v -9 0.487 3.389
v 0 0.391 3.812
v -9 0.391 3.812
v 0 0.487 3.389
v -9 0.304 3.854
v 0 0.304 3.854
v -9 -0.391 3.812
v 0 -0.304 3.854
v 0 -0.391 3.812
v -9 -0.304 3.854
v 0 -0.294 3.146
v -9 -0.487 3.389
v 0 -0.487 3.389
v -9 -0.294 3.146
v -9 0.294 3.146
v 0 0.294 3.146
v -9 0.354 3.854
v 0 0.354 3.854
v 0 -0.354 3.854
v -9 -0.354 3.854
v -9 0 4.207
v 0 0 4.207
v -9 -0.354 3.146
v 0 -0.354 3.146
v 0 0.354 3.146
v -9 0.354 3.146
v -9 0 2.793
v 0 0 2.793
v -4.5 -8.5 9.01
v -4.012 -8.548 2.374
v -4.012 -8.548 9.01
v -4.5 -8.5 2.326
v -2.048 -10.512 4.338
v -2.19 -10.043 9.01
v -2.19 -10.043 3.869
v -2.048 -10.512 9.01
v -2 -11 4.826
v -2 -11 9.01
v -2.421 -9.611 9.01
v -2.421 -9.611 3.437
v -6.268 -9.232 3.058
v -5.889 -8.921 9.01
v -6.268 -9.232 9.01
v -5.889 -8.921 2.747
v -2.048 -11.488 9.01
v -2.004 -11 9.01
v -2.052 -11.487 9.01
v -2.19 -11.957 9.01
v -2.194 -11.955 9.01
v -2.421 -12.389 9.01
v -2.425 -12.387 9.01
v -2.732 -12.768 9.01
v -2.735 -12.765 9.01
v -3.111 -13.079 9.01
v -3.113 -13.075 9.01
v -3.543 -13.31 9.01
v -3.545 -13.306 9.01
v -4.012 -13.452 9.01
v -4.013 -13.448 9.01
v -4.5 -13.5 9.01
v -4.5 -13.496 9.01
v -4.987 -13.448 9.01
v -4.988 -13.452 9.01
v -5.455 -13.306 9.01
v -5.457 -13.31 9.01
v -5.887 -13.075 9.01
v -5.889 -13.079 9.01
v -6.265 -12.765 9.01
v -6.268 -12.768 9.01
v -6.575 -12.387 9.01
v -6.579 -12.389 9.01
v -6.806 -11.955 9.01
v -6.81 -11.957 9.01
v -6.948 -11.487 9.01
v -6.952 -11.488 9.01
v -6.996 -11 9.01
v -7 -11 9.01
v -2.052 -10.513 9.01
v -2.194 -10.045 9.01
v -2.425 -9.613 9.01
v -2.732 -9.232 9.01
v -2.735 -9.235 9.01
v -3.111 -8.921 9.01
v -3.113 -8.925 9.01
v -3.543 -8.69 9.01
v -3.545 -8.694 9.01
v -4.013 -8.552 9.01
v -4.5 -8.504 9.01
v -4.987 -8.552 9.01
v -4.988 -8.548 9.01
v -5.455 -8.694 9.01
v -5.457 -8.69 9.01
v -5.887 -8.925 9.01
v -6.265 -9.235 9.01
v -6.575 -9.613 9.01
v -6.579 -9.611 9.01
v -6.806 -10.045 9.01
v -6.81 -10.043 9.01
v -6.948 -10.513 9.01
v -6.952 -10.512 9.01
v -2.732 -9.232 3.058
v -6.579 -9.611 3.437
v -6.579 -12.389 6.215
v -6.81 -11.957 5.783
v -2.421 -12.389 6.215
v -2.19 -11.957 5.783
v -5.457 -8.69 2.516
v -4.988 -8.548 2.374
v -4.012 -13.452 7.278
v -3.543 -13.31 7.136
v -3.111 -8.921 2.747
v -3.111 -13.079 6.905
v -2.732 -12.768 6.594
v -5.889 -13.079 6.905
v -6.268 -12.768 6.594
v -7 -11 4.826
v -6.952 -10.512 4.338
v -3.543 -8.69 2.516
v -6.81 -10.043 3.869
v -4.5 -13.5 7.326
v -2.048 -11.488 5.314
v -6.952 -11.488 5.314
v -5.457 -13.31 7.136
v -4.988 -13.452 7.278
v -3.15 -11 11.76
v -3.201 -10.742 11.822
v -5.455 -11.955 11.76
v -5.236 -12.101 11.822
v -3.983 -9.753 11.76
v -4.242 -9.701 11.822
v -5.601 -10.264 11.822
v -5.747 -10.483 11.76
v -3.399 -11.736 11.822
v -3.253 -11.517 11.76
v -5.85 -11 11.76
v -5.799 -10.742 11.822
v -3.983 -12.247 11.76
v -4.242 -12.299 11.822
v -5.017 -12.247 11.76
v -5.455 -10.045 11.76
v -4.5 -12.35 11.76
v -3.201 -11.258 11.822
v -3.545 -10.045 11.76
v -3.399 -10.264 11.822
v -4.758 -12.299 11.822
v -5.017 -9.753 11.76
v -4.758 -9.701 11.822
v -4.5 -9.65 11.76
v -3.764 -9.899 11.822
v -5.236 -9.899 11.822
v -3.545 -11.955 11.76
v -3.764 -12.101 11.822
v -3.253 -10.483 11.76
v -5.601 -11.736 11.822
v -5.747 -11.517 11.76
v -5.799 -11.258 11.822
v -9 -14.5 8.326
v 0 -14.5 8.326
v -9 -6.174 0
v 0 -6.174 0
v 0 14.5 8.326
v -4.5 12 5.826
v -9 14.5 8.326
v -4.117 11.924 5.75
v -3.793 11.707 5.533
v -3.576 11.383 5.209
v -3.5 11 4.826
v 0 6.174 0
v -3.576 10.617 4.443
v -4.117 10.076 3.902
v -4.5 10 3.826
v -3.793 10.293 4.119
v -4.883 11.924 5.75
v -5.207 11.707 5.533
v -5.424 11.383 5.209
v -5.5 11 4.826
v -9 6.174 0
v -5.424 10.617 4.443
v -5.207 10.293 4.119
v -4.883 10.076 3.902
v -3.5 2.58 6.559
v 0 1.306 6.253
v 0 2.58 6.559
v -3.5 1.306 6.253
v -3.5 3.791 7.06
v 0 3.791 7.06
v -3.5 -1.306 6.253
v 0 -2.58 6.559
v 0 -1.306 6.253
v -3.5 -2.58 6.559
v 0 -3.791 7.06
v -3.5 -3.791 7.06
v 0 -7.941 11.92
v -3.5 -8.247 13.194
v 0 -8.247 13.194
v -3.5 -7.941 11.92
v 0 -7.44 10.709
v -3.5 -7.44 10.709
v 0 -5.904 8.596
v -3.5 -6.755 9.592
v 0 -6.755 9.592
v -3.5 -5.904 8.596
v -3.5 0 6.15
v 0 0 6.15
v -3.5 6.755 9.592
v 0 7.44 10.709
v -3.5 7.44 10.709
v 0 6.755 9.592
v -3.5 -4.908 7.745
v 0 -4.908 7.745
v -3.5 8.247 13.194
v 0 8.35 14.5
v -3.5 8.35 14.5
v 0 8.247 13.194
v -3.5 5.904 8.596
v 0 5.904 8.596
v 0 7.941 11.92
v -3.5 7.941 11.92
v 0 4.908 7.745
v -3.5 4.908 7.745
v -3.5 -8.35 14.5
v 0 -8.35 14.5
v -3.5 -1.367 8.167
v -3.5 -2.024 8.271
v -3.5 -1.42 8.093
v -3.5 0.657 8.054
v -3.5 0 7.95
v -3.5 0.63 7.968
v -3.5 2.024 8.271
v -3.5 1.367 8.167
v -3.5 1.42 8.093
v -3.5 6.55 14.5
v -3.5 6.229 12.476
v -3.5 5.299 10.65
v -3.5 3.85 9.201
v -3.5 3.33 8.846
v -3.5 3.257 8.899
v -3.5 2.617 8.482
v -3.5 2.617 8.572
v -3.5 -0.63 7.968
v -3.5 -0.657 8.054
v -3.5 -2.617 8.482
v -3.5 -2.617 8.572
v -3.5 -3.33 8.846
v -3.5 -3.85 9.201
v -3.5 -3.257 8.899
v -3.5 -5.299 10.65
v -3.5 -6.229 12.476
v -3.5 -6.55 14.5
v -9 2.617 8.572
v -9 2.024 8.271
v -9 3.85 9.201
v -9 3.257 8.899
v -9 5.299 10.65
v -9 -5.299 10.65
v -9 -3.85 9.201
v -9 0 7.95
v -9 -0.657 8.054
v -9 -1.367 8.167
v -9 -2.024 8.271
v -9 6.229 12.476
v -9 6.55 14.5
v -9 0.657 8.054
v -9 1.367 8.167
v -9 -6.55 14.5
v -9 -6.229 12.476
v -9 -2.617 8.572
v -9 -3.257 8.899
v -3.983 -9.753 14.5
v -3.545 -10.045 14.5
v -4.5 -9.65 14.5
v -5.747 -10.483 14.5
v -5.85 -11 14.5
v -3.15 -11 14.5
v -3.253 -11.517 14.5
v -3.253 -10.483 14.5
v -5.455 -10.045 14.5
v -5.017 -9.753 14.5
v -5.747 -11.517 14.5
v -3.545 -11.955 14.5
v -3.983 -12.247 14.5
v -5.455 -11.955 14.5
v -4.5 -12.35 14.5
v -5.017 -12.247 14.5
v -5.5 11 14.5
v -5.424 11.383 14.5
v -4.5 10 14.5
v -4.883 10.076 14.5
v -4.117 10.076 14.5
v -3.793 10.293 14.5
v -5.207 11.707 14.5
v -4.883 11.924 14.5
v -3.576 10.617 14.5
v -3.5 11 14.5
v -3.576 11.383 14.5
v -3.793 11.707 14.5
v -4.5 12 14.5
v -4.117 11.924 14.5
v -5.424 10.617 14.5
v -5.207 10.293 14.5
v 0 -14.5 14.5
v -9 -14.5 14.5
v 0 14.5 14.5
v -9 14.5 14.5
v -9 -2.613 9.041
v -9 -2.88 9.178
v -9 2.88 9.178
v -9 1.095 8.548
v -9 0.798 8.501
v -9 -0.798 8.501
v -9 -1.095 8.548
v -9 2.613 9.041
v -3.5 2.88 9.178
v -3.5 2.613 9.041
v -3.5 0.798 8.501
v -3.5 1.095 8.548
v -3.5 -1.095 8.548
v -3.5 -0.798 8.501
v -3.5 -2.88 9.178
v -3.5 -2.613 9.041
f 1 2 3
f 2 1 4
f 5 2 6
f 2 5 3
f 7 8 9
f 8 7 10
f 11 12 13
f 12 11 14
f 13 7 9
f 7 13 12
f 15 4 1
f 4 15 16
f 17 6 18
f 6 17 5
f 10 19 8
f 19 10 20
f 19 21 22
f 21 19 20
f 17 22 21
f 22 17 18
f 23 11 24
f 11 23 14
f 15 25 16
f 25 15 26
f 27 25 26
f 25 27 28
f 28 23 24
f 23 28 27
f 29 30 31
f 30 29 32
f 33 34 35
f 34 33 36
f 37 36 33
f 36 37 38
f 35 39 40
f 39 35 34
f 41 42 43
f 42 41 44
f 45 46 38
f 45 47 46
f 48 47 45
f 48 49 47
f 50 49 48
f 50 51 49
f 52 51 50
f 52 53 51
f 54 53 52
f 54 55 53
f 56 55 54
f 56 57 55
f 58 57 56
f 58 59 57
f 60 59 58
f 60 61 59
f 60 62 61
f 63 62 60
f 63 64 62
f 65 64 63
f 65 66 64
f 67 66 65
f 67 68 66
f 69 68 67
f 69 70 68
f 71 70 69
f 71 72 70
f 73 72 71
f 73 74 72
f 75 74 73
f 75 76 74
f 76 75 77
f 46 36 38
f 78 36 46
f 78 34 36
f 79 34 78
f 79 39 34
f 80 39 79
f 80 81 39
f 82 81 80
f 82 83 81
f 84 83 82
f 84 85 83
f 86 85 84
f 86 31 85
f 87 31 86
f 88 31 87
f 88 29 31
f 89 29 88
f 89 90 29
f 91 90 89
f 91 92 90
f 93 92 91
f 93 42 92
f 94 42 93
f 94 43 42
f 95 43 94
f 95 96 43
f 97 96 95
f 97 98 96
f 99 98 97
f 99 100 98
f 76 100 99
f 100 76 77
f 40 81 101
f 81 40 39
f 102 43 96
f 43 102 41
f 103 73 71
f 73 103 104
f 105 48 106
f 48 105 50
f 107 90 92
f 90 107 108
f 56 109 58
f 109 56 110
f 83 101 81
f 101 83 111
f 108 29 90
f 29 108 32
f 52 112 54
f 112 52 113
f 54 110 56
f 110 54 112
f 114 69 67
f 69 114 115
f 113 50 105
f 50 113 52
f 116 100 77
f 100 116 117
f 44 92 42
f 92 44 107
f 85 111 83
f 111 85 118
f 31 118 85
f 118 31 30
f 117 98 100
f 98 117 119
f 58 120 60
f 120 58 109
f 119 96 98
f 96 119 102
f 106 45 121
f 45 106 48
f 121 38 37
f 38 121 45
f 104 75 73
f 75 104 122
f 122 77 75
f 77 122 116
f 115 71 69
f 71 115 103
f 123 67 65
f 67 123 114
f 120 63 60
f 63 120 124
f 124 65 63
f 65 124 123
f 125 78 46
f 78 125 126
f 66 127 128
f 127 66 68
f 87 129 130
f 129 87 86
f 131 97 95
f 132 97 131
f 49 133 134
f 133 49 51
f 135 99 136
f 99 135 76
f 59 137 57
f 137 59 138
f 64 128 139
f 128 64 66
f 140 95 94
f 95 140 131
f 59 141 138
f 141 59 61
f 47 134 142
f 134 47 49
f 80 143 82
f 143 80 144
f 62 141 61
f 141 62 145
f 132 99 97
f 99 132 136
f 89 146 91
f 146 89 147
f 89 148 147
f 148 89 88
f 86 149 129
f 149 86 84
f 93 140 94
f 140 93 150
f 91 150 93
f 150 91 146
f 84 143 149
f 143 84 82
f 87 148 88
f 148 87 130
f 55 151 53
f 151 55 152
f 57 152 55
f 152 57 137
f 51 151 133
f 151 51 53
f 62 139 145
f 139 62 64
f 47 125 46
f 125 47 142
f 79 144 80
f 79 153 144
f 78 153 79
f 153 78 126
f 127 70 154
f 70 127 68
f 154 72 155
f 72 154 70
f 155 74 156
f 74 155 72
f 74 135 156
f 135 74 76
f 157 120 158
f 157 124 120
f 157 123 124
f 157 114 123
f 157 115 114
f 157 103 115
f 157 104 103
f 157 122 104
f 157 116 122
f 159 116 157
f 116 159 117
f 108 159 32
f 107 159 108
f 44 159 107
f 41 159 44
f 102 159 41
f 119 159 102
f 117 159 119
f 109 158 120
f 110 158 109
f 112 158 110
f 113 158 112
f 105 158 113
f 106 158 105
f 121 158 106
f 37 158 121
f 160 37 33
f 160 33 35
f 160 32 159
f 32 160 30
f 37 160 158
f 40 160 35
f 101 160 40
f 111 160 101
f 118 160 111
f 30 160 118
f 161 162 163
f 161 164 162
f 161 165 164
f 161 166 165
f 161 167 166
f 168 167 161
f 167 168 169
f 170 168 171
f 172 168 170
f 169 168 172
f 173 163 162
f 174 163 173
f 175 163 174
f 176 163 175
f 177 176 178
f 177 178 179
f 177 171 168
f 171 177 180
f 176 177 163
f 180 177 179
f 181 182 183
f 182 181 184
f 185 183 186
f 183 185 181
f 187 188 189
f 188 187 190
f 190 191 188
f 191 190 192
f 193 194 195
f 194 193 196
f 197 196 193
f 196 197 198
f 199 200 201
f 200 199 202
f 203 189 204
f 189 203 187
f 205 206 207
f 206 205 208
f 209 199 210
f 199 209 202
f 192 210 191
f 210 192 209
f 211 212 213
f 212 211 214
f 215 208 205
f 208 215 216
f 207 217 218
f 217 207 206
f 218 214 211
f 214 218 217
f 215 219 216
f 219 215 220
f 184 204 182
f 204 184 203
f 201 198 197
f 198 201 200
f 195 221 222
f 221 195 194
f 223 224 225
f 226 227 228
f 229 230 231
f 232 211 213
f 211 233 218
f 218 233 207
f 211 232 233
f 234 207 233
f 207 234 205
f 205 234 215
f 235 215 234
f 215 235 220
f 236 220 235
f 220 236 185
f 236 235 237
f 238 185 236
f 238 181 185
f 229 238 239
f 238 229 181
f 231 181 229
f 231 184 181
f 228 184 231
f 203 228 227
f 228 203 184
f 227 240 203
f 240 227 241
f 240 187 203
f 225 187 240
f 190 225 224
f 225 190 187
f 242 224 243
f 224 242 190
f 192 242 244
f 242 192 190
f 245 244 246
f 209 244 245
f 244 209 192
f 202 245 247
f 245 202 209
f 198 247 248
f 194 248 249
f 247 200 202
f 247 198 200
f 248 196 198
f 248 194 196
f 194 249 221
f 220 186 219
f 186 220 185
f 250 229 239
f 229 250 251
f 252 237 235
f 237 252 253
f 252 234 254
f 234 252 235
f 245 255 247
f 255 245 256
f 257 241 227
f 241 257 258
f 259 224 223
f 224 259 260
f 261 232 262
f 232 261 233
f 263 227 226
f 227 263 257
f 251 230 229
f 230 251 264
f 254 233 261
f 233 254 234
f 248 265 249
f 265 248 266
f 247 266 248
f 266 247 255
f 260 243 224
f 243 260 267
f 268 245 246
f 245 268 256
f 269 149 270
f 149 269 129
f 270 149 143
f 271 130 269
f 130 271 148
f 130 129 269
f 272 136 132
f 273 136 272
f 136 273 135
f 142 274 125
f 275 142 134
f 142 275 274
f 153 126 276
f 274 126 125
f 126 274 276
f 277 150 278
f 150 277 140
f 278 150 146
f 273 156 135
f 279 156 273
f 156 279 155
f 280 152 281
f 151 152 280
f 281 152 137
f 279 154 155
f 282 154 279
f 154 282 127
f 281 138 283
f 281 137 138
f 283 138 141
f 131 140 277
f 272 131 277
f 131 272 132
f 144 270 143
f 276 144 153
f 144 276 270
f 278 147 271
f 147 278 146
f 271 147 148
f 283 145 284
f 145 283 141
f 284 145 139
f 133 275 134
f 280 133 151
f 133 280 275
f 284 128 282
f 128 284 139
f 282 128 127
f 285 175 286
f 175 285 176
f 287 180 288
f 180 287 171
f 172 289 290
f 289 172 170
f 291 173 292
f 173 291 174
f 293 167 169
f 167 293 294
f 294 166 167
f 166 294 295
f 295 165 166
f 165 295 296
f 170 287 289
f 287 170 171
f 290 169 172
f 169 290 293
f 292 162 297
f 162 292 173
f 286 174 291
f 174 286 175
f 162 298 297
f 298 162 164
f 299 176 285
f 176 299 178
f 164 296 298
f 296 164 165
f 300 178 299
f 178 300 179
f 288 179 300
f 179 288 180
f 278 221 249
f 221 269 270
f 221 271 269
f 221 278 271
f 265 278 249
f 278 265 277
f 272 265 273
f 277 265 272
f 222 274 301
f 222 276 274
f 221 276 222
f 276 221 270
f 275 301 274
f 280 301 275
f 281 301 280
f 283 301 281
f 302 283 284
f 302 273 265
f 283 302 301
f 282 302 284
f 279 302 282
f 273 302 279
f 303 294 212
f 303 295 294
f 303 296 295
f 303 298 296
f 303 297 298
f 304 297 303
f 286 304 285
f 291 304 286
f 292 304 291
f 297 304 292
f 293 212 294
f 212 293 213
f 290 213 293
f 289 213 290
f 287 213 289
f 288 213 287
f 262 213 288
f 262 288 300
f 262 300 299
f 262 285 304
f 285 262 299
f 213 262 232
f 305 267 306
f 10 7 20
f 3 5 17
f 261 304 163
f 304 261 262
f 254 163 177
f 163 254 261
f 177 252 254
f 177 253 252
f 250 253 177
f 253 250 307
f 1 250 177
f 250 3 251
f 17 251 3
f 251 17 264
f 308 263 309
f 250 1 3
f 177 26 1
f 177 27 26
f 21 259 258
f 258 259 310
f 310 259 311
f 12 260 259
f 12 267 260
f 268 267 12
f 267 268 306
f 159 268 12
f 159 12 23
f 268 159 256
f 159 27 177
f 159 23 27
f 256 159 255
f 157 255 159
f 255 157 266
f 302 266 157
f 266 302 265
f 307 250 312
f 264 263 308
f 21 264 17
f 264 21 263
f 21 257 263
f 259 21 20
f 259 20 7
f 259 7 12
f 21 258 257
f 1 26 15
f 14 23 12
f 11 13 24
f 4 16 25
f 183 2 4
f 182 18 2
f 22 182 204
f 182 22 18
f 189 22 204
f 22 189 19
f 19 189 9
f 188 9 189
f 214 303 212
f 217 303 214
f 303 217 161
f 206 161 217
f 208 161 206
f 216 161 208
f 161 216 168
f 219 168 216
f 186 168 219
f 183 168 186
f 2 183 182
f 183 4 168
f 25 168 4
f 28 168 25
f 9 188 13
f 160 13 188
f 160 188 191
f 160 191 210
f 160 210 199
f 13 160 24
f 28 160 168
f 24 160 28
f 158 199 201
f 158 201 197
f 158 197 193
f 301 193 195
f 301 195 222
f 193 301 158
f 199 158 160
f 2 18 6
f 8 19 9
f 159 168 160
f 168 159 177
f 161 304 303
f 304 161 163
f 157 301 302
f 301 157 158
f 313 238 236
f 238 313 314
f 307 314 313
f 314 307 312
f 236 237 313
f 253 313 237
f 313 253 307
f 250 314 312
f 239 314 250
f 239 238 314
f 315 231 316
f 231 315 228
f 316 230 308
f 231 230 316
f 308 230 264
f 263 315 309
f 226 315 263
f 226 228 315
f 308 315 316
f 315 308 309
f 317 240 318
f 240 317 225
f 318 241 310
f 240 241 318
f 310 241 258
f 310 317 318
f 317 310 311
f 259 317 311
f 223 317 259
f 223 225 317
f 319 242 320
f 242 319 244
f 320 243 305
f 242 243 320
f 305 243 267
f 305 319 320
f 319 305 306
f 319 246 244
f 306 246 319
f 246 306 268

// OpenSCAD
// file: nut_cutter.scad
module nut_cutter(w=5.65,depth=6,ins_delta=0.4,ins_depth=2,trans_depth=3)
{
    d=0; // z position
    chep_nut_d=w * (2/sqrt(3)); // nut tight hex
    chep_nut_depth=depth; // total depth
    chep_nut_ins_d=chep_nut_d+ins_delta; // enlarged insertion hex
    chep_nut_ins_depth=ins_depth; // insertion depth
    chep_nut_transition_depth=trans_depth; // easier 3D print, conical transition

    // duboki tijesni utor za maticu
    translate([0,0,-d/2+chep_nut_depth/2-0.001])
      cylinder(d=chep_nut_d,h=chep_nut_depth,$fn=6,center=true);
    // plitki labavi utor za maticu
    translate([0,0,-d/2+chep_nut_ins_depth/2-0.001])
      cylinder(d=chep_nut_ins_d,h=chep_nut_ins_depth,$fn=6,center=true);
    // konusni prijelaz za lakše printanje
    if(1)
    translate([0,0,-d/2+chep_nut_depth+chep_nut_transition_depth/2-0.001])
      cylinder(d1=chep_nut_d,d2=0,h=chep_nut_transition_depth+0.005,$fn=6,center=true);
}

module head_cutter(d=6,h=5)
{
  delta=0.01;
  translate([0,0,-delta])
  cylinder(d=d,h=h+2*delta,$fn=32);
  translate([0,0,h])
    cylinder(d1=d,d2=0,h*2/3,$fn=32);
    
}

//nut_cutter();
//head_cutter();
// main file
/* all measures in mm */
include <nut_cutter.scad>

/* todo:
** [x] dent holes must be aligned, not dents
** [x] narrower and smaller big dents
** [x] intercusp strain release smaller, 0.1mm
** [x] remove intercuspidation
** [x] M3 thread: -0.15
** [x] M4 thread: -0.20, waterdrop
** [x] 30 mm mount holes M4
** [x] thread for M4
** [x] cut-snap 2 piece
** [x] subtract cube, leave only lower cut-snap
** [x] 2 screws M3 to tighten cut-snap
** [x] thread for M3
** [x] remove some dents - cannot assemble!!
*/

/* Z-extrusion height (vertical) enough to hold M3 screw hole */
zdim = 9;
/* X-length */
xdim = 29;
/* Y-width */
ydim = 29;

/* free space between parts */
freespace_big = 0.0;
freespace_small = 0.1;

/* number of small dents */
ndent1 = 40;
/* dent depth */
ddent1 = 0.0; // 0.5 default, 0 to disable
/* dent width large */
wdent1l = 0.8;
/* dent width small */
wdent1s = 0.3; 
/* big wheel radius (with dents d = 16.7mm)  */
rbig = (16.7+freespace_big)/2;
/* big wheel height */
zbig = 3.5;

/* number of big dents = half of small dents */
ndent2 = ndent1/2;
/* dent depth */
ddent2 = 0.5;
/* dent width large */
wdent2l = 0.8;
/* dent width small */
wdent2s = 0.3;
/* small wheel radius (with dents d = 13.0mm) */
rsmall = (13.0+freespace_small)/2;

/* make sure we cut it all */
overcut = 0.001;

/* mounting hole radius */
rmounthole = 1.0/2;
/* mounting holes distance */
dmounthole = 22;

/* tightening screws distance (B careful, do not intersect dents) */
dtighthole = 22;
/* let M3 screw pass freely */
rM3free = (3+0.6)/2;
/* M3 screw threadhole */
rM3thread = (3-0.17)/2; // real M3

/* intercuspidation Y center aligns with tightening hole */
ycuspcenter = dtighthole/2;
/* intercuspidation depth */
dcusp = 4;
/* intercuspidation small, big */
icusps = 4;
icuspb = 5;
freecusp = 0.1;

module droplet_profile(h, r, rotation) {
        union()
        {
          cylinder(h = h, r = r, $fa=360/16, $fs=0.5, center=true);
            rotate([0,0,rotation])
              linear_extrude(height = h, twist = 0, convexity = 2, center=true)
                polygon([
                 [ -r * sqrt(2)/2, r * sqrt(2)/2],
                 [              0, r * sqrt(2)],
                 [  r * sqrt(2)/2, r * sqrt(2)/2],
                 ]);
        }

}

module eye_profile(h, r, rotation) {
        union()
        {
          cylinder(h = h, r = r, $fa=360/16, $fs=0.5, center=true);
          rotate([0,0,rotation])
              linear_extrude(height = h, twist = 0, convexity = 2, center=true)
                polygon([
                 [ -r * sqrt(2)/2, r * sqrt(2)/2],
                 [              0, r * sqrt(2)],
                 [  r * sqrt(2)/2, r * sqrt(2)/2],
                 ]);
          rotate([0,0,180+rotation])
              linear_extrude(height = h, twist = 0, convexity = 2, center=true)
                polygon([
                 [ -r * sqrt(2)/2, r * sqrt(2)/2],
                 [              0, r * sqrt(2)],
                 [  r * sqrt(2)/2, r * sqrt(2)/2],
                 ]);
        }
}

module sprocket_adapter() {
delta=0.001;
union() {
  difference() {
    translate([0,0,zdim/2])
      cube([xdim, ydim, zdim], center=true);
    union() {
      translate([0,0,zbig/2])
          cylinder(h=zbig+delta, r=rbig, $fa=360/ndent1, $fs=0.5, center=true);
      translate([0,0,zdim/2])
          cylinder(h=zdim+delta, r=rsmall, $fa=360/ndent2, $fs=0.5, center=true);

      /* 2 holes for screws cca 30 mm apart */
      translate([-dmounthole/2,0,zdim/2])
        eye_profile(h = zdim + overcut, r = rmounthole, rotation = -90);
      translate([ dmounthole/2,0,zdim/2])
        eye_profile(h = zdim + overcut, r = rmounthole, rotation = 90);

      /* tightening M3 screw, larger in "removed" part */
      translate([0,-dtighthole/2,zdim/2])
        rotate([0,90,0])
          cylinder(d=2.7,h=xdim+overcut,$fn=16,center=true); // circular
          //eye_profile(h = xdim+overcut, r = rM3free, rotation = -90); // droplet shape

    translate([-xdim/2,-dtighthole/2,zdim/2])
      rotate([0,90,0])
         head_cutter(d=5,h=9);

      /* tightening M3 screw, with droplet shape, smaller/thread in "extended" part */
    translate([0,dtighthole/2,zdim/2])
      rotate([0,90,0])
        cylinder(d=2.0,h=xdim+overcut,$fn=16,center=true); // circular
          //eye_profile(h = xdim+overcut, r = rM3thread, rotation = -90); // droplet shape

      /* polygon cuts this in snap-on half */
      translate([0,0,-delta/2])
      linear_extrude(height = zdim+delta, twist = 0, convexity = 8)
        polygon([[ 0,               -ydim/2],
                 [ xdim,            -ydim/2],
                 [ xdim,             ydim/2],
                 [ 0,                ydim/2],
                 [ 0,                ycuspcenter+icusps/2],

/* intercuspidation removed */
/*
                 [ dcusp,            ycuspcenter+icuspb/2],
                 [ dcusp,            ycuspcenter-icuspb/2],
                 [ 0,                ycuspcenter-icusps/2],
                 [ 0,               -ycuspcenter+icusps/2+freecusp],
                 [-dcusp-freecusp,  -ycuspcenter+icuspb/2+freecusp],
                 [-dcusp-freecusp,  -ycuspcenter-icuspb/2-freecusp],
                 [ 0,               -ycuspcenter-icusps/2-freecusp]
*/
                 ]*(1+delta));

      /* cuts off upper notch for easier insertion */
      translate([dcusp/2,0,zbig/2])
        cube([dcusp,ydim,zbig], center = true);

      /* cut off corners */
      for(i=[-1:2:1])
      translate([-xdim/2,ydim*i*0.92,zdim/2])
        rotate([0,0,45])
          cube([xdim,ydim,zdim+delta],center=true);
    }
  }

      /* big radius, small dents */
      for(angle = [360/ndent1/2 : 360/ndent1 : 360])
        if(angle > 180-50 && angle < 180+50)
        rotate([0,0,angle])
          translate([rbig-ddent1/2,0,0])
          {
            linear_extrude(height = zbig, twist = 0, convexity = 2)
              polygon([[ ddent1/2,        -wdent1l/2],
                       [-ddent1/2,        -wdent1s/2],
                       [-ddent1/2,         wdent1s/2],
                       [ ddent1/2,         wdent1l/2]]);
          }

      /* small radius, big dents */
      for(angle = [360/ndent2/2 : 360/ndent2 : 360])
        if(angle > 180-30 && angle < 180+30)
        rotate([0,0,angle])
          translate([rsmall-ddent2/2,0,zbig])
          {
            linear_extrude(height = zdim-zbig, twist = 0, convexity = 2)
              polygon([[ ddent2/2,        -wdent2l/2],
                       [-ddent2/2,        -wdent2s/2],
                       [-ddent2/2,         wdent2s/2],
                       [ ddent2/2,         wdent2l/2]]);
          }
}

}

// printable position
if(1)
translate([0,0,xdim/2])
  rotate([0,-90,0])
    sprocket_adapter();
